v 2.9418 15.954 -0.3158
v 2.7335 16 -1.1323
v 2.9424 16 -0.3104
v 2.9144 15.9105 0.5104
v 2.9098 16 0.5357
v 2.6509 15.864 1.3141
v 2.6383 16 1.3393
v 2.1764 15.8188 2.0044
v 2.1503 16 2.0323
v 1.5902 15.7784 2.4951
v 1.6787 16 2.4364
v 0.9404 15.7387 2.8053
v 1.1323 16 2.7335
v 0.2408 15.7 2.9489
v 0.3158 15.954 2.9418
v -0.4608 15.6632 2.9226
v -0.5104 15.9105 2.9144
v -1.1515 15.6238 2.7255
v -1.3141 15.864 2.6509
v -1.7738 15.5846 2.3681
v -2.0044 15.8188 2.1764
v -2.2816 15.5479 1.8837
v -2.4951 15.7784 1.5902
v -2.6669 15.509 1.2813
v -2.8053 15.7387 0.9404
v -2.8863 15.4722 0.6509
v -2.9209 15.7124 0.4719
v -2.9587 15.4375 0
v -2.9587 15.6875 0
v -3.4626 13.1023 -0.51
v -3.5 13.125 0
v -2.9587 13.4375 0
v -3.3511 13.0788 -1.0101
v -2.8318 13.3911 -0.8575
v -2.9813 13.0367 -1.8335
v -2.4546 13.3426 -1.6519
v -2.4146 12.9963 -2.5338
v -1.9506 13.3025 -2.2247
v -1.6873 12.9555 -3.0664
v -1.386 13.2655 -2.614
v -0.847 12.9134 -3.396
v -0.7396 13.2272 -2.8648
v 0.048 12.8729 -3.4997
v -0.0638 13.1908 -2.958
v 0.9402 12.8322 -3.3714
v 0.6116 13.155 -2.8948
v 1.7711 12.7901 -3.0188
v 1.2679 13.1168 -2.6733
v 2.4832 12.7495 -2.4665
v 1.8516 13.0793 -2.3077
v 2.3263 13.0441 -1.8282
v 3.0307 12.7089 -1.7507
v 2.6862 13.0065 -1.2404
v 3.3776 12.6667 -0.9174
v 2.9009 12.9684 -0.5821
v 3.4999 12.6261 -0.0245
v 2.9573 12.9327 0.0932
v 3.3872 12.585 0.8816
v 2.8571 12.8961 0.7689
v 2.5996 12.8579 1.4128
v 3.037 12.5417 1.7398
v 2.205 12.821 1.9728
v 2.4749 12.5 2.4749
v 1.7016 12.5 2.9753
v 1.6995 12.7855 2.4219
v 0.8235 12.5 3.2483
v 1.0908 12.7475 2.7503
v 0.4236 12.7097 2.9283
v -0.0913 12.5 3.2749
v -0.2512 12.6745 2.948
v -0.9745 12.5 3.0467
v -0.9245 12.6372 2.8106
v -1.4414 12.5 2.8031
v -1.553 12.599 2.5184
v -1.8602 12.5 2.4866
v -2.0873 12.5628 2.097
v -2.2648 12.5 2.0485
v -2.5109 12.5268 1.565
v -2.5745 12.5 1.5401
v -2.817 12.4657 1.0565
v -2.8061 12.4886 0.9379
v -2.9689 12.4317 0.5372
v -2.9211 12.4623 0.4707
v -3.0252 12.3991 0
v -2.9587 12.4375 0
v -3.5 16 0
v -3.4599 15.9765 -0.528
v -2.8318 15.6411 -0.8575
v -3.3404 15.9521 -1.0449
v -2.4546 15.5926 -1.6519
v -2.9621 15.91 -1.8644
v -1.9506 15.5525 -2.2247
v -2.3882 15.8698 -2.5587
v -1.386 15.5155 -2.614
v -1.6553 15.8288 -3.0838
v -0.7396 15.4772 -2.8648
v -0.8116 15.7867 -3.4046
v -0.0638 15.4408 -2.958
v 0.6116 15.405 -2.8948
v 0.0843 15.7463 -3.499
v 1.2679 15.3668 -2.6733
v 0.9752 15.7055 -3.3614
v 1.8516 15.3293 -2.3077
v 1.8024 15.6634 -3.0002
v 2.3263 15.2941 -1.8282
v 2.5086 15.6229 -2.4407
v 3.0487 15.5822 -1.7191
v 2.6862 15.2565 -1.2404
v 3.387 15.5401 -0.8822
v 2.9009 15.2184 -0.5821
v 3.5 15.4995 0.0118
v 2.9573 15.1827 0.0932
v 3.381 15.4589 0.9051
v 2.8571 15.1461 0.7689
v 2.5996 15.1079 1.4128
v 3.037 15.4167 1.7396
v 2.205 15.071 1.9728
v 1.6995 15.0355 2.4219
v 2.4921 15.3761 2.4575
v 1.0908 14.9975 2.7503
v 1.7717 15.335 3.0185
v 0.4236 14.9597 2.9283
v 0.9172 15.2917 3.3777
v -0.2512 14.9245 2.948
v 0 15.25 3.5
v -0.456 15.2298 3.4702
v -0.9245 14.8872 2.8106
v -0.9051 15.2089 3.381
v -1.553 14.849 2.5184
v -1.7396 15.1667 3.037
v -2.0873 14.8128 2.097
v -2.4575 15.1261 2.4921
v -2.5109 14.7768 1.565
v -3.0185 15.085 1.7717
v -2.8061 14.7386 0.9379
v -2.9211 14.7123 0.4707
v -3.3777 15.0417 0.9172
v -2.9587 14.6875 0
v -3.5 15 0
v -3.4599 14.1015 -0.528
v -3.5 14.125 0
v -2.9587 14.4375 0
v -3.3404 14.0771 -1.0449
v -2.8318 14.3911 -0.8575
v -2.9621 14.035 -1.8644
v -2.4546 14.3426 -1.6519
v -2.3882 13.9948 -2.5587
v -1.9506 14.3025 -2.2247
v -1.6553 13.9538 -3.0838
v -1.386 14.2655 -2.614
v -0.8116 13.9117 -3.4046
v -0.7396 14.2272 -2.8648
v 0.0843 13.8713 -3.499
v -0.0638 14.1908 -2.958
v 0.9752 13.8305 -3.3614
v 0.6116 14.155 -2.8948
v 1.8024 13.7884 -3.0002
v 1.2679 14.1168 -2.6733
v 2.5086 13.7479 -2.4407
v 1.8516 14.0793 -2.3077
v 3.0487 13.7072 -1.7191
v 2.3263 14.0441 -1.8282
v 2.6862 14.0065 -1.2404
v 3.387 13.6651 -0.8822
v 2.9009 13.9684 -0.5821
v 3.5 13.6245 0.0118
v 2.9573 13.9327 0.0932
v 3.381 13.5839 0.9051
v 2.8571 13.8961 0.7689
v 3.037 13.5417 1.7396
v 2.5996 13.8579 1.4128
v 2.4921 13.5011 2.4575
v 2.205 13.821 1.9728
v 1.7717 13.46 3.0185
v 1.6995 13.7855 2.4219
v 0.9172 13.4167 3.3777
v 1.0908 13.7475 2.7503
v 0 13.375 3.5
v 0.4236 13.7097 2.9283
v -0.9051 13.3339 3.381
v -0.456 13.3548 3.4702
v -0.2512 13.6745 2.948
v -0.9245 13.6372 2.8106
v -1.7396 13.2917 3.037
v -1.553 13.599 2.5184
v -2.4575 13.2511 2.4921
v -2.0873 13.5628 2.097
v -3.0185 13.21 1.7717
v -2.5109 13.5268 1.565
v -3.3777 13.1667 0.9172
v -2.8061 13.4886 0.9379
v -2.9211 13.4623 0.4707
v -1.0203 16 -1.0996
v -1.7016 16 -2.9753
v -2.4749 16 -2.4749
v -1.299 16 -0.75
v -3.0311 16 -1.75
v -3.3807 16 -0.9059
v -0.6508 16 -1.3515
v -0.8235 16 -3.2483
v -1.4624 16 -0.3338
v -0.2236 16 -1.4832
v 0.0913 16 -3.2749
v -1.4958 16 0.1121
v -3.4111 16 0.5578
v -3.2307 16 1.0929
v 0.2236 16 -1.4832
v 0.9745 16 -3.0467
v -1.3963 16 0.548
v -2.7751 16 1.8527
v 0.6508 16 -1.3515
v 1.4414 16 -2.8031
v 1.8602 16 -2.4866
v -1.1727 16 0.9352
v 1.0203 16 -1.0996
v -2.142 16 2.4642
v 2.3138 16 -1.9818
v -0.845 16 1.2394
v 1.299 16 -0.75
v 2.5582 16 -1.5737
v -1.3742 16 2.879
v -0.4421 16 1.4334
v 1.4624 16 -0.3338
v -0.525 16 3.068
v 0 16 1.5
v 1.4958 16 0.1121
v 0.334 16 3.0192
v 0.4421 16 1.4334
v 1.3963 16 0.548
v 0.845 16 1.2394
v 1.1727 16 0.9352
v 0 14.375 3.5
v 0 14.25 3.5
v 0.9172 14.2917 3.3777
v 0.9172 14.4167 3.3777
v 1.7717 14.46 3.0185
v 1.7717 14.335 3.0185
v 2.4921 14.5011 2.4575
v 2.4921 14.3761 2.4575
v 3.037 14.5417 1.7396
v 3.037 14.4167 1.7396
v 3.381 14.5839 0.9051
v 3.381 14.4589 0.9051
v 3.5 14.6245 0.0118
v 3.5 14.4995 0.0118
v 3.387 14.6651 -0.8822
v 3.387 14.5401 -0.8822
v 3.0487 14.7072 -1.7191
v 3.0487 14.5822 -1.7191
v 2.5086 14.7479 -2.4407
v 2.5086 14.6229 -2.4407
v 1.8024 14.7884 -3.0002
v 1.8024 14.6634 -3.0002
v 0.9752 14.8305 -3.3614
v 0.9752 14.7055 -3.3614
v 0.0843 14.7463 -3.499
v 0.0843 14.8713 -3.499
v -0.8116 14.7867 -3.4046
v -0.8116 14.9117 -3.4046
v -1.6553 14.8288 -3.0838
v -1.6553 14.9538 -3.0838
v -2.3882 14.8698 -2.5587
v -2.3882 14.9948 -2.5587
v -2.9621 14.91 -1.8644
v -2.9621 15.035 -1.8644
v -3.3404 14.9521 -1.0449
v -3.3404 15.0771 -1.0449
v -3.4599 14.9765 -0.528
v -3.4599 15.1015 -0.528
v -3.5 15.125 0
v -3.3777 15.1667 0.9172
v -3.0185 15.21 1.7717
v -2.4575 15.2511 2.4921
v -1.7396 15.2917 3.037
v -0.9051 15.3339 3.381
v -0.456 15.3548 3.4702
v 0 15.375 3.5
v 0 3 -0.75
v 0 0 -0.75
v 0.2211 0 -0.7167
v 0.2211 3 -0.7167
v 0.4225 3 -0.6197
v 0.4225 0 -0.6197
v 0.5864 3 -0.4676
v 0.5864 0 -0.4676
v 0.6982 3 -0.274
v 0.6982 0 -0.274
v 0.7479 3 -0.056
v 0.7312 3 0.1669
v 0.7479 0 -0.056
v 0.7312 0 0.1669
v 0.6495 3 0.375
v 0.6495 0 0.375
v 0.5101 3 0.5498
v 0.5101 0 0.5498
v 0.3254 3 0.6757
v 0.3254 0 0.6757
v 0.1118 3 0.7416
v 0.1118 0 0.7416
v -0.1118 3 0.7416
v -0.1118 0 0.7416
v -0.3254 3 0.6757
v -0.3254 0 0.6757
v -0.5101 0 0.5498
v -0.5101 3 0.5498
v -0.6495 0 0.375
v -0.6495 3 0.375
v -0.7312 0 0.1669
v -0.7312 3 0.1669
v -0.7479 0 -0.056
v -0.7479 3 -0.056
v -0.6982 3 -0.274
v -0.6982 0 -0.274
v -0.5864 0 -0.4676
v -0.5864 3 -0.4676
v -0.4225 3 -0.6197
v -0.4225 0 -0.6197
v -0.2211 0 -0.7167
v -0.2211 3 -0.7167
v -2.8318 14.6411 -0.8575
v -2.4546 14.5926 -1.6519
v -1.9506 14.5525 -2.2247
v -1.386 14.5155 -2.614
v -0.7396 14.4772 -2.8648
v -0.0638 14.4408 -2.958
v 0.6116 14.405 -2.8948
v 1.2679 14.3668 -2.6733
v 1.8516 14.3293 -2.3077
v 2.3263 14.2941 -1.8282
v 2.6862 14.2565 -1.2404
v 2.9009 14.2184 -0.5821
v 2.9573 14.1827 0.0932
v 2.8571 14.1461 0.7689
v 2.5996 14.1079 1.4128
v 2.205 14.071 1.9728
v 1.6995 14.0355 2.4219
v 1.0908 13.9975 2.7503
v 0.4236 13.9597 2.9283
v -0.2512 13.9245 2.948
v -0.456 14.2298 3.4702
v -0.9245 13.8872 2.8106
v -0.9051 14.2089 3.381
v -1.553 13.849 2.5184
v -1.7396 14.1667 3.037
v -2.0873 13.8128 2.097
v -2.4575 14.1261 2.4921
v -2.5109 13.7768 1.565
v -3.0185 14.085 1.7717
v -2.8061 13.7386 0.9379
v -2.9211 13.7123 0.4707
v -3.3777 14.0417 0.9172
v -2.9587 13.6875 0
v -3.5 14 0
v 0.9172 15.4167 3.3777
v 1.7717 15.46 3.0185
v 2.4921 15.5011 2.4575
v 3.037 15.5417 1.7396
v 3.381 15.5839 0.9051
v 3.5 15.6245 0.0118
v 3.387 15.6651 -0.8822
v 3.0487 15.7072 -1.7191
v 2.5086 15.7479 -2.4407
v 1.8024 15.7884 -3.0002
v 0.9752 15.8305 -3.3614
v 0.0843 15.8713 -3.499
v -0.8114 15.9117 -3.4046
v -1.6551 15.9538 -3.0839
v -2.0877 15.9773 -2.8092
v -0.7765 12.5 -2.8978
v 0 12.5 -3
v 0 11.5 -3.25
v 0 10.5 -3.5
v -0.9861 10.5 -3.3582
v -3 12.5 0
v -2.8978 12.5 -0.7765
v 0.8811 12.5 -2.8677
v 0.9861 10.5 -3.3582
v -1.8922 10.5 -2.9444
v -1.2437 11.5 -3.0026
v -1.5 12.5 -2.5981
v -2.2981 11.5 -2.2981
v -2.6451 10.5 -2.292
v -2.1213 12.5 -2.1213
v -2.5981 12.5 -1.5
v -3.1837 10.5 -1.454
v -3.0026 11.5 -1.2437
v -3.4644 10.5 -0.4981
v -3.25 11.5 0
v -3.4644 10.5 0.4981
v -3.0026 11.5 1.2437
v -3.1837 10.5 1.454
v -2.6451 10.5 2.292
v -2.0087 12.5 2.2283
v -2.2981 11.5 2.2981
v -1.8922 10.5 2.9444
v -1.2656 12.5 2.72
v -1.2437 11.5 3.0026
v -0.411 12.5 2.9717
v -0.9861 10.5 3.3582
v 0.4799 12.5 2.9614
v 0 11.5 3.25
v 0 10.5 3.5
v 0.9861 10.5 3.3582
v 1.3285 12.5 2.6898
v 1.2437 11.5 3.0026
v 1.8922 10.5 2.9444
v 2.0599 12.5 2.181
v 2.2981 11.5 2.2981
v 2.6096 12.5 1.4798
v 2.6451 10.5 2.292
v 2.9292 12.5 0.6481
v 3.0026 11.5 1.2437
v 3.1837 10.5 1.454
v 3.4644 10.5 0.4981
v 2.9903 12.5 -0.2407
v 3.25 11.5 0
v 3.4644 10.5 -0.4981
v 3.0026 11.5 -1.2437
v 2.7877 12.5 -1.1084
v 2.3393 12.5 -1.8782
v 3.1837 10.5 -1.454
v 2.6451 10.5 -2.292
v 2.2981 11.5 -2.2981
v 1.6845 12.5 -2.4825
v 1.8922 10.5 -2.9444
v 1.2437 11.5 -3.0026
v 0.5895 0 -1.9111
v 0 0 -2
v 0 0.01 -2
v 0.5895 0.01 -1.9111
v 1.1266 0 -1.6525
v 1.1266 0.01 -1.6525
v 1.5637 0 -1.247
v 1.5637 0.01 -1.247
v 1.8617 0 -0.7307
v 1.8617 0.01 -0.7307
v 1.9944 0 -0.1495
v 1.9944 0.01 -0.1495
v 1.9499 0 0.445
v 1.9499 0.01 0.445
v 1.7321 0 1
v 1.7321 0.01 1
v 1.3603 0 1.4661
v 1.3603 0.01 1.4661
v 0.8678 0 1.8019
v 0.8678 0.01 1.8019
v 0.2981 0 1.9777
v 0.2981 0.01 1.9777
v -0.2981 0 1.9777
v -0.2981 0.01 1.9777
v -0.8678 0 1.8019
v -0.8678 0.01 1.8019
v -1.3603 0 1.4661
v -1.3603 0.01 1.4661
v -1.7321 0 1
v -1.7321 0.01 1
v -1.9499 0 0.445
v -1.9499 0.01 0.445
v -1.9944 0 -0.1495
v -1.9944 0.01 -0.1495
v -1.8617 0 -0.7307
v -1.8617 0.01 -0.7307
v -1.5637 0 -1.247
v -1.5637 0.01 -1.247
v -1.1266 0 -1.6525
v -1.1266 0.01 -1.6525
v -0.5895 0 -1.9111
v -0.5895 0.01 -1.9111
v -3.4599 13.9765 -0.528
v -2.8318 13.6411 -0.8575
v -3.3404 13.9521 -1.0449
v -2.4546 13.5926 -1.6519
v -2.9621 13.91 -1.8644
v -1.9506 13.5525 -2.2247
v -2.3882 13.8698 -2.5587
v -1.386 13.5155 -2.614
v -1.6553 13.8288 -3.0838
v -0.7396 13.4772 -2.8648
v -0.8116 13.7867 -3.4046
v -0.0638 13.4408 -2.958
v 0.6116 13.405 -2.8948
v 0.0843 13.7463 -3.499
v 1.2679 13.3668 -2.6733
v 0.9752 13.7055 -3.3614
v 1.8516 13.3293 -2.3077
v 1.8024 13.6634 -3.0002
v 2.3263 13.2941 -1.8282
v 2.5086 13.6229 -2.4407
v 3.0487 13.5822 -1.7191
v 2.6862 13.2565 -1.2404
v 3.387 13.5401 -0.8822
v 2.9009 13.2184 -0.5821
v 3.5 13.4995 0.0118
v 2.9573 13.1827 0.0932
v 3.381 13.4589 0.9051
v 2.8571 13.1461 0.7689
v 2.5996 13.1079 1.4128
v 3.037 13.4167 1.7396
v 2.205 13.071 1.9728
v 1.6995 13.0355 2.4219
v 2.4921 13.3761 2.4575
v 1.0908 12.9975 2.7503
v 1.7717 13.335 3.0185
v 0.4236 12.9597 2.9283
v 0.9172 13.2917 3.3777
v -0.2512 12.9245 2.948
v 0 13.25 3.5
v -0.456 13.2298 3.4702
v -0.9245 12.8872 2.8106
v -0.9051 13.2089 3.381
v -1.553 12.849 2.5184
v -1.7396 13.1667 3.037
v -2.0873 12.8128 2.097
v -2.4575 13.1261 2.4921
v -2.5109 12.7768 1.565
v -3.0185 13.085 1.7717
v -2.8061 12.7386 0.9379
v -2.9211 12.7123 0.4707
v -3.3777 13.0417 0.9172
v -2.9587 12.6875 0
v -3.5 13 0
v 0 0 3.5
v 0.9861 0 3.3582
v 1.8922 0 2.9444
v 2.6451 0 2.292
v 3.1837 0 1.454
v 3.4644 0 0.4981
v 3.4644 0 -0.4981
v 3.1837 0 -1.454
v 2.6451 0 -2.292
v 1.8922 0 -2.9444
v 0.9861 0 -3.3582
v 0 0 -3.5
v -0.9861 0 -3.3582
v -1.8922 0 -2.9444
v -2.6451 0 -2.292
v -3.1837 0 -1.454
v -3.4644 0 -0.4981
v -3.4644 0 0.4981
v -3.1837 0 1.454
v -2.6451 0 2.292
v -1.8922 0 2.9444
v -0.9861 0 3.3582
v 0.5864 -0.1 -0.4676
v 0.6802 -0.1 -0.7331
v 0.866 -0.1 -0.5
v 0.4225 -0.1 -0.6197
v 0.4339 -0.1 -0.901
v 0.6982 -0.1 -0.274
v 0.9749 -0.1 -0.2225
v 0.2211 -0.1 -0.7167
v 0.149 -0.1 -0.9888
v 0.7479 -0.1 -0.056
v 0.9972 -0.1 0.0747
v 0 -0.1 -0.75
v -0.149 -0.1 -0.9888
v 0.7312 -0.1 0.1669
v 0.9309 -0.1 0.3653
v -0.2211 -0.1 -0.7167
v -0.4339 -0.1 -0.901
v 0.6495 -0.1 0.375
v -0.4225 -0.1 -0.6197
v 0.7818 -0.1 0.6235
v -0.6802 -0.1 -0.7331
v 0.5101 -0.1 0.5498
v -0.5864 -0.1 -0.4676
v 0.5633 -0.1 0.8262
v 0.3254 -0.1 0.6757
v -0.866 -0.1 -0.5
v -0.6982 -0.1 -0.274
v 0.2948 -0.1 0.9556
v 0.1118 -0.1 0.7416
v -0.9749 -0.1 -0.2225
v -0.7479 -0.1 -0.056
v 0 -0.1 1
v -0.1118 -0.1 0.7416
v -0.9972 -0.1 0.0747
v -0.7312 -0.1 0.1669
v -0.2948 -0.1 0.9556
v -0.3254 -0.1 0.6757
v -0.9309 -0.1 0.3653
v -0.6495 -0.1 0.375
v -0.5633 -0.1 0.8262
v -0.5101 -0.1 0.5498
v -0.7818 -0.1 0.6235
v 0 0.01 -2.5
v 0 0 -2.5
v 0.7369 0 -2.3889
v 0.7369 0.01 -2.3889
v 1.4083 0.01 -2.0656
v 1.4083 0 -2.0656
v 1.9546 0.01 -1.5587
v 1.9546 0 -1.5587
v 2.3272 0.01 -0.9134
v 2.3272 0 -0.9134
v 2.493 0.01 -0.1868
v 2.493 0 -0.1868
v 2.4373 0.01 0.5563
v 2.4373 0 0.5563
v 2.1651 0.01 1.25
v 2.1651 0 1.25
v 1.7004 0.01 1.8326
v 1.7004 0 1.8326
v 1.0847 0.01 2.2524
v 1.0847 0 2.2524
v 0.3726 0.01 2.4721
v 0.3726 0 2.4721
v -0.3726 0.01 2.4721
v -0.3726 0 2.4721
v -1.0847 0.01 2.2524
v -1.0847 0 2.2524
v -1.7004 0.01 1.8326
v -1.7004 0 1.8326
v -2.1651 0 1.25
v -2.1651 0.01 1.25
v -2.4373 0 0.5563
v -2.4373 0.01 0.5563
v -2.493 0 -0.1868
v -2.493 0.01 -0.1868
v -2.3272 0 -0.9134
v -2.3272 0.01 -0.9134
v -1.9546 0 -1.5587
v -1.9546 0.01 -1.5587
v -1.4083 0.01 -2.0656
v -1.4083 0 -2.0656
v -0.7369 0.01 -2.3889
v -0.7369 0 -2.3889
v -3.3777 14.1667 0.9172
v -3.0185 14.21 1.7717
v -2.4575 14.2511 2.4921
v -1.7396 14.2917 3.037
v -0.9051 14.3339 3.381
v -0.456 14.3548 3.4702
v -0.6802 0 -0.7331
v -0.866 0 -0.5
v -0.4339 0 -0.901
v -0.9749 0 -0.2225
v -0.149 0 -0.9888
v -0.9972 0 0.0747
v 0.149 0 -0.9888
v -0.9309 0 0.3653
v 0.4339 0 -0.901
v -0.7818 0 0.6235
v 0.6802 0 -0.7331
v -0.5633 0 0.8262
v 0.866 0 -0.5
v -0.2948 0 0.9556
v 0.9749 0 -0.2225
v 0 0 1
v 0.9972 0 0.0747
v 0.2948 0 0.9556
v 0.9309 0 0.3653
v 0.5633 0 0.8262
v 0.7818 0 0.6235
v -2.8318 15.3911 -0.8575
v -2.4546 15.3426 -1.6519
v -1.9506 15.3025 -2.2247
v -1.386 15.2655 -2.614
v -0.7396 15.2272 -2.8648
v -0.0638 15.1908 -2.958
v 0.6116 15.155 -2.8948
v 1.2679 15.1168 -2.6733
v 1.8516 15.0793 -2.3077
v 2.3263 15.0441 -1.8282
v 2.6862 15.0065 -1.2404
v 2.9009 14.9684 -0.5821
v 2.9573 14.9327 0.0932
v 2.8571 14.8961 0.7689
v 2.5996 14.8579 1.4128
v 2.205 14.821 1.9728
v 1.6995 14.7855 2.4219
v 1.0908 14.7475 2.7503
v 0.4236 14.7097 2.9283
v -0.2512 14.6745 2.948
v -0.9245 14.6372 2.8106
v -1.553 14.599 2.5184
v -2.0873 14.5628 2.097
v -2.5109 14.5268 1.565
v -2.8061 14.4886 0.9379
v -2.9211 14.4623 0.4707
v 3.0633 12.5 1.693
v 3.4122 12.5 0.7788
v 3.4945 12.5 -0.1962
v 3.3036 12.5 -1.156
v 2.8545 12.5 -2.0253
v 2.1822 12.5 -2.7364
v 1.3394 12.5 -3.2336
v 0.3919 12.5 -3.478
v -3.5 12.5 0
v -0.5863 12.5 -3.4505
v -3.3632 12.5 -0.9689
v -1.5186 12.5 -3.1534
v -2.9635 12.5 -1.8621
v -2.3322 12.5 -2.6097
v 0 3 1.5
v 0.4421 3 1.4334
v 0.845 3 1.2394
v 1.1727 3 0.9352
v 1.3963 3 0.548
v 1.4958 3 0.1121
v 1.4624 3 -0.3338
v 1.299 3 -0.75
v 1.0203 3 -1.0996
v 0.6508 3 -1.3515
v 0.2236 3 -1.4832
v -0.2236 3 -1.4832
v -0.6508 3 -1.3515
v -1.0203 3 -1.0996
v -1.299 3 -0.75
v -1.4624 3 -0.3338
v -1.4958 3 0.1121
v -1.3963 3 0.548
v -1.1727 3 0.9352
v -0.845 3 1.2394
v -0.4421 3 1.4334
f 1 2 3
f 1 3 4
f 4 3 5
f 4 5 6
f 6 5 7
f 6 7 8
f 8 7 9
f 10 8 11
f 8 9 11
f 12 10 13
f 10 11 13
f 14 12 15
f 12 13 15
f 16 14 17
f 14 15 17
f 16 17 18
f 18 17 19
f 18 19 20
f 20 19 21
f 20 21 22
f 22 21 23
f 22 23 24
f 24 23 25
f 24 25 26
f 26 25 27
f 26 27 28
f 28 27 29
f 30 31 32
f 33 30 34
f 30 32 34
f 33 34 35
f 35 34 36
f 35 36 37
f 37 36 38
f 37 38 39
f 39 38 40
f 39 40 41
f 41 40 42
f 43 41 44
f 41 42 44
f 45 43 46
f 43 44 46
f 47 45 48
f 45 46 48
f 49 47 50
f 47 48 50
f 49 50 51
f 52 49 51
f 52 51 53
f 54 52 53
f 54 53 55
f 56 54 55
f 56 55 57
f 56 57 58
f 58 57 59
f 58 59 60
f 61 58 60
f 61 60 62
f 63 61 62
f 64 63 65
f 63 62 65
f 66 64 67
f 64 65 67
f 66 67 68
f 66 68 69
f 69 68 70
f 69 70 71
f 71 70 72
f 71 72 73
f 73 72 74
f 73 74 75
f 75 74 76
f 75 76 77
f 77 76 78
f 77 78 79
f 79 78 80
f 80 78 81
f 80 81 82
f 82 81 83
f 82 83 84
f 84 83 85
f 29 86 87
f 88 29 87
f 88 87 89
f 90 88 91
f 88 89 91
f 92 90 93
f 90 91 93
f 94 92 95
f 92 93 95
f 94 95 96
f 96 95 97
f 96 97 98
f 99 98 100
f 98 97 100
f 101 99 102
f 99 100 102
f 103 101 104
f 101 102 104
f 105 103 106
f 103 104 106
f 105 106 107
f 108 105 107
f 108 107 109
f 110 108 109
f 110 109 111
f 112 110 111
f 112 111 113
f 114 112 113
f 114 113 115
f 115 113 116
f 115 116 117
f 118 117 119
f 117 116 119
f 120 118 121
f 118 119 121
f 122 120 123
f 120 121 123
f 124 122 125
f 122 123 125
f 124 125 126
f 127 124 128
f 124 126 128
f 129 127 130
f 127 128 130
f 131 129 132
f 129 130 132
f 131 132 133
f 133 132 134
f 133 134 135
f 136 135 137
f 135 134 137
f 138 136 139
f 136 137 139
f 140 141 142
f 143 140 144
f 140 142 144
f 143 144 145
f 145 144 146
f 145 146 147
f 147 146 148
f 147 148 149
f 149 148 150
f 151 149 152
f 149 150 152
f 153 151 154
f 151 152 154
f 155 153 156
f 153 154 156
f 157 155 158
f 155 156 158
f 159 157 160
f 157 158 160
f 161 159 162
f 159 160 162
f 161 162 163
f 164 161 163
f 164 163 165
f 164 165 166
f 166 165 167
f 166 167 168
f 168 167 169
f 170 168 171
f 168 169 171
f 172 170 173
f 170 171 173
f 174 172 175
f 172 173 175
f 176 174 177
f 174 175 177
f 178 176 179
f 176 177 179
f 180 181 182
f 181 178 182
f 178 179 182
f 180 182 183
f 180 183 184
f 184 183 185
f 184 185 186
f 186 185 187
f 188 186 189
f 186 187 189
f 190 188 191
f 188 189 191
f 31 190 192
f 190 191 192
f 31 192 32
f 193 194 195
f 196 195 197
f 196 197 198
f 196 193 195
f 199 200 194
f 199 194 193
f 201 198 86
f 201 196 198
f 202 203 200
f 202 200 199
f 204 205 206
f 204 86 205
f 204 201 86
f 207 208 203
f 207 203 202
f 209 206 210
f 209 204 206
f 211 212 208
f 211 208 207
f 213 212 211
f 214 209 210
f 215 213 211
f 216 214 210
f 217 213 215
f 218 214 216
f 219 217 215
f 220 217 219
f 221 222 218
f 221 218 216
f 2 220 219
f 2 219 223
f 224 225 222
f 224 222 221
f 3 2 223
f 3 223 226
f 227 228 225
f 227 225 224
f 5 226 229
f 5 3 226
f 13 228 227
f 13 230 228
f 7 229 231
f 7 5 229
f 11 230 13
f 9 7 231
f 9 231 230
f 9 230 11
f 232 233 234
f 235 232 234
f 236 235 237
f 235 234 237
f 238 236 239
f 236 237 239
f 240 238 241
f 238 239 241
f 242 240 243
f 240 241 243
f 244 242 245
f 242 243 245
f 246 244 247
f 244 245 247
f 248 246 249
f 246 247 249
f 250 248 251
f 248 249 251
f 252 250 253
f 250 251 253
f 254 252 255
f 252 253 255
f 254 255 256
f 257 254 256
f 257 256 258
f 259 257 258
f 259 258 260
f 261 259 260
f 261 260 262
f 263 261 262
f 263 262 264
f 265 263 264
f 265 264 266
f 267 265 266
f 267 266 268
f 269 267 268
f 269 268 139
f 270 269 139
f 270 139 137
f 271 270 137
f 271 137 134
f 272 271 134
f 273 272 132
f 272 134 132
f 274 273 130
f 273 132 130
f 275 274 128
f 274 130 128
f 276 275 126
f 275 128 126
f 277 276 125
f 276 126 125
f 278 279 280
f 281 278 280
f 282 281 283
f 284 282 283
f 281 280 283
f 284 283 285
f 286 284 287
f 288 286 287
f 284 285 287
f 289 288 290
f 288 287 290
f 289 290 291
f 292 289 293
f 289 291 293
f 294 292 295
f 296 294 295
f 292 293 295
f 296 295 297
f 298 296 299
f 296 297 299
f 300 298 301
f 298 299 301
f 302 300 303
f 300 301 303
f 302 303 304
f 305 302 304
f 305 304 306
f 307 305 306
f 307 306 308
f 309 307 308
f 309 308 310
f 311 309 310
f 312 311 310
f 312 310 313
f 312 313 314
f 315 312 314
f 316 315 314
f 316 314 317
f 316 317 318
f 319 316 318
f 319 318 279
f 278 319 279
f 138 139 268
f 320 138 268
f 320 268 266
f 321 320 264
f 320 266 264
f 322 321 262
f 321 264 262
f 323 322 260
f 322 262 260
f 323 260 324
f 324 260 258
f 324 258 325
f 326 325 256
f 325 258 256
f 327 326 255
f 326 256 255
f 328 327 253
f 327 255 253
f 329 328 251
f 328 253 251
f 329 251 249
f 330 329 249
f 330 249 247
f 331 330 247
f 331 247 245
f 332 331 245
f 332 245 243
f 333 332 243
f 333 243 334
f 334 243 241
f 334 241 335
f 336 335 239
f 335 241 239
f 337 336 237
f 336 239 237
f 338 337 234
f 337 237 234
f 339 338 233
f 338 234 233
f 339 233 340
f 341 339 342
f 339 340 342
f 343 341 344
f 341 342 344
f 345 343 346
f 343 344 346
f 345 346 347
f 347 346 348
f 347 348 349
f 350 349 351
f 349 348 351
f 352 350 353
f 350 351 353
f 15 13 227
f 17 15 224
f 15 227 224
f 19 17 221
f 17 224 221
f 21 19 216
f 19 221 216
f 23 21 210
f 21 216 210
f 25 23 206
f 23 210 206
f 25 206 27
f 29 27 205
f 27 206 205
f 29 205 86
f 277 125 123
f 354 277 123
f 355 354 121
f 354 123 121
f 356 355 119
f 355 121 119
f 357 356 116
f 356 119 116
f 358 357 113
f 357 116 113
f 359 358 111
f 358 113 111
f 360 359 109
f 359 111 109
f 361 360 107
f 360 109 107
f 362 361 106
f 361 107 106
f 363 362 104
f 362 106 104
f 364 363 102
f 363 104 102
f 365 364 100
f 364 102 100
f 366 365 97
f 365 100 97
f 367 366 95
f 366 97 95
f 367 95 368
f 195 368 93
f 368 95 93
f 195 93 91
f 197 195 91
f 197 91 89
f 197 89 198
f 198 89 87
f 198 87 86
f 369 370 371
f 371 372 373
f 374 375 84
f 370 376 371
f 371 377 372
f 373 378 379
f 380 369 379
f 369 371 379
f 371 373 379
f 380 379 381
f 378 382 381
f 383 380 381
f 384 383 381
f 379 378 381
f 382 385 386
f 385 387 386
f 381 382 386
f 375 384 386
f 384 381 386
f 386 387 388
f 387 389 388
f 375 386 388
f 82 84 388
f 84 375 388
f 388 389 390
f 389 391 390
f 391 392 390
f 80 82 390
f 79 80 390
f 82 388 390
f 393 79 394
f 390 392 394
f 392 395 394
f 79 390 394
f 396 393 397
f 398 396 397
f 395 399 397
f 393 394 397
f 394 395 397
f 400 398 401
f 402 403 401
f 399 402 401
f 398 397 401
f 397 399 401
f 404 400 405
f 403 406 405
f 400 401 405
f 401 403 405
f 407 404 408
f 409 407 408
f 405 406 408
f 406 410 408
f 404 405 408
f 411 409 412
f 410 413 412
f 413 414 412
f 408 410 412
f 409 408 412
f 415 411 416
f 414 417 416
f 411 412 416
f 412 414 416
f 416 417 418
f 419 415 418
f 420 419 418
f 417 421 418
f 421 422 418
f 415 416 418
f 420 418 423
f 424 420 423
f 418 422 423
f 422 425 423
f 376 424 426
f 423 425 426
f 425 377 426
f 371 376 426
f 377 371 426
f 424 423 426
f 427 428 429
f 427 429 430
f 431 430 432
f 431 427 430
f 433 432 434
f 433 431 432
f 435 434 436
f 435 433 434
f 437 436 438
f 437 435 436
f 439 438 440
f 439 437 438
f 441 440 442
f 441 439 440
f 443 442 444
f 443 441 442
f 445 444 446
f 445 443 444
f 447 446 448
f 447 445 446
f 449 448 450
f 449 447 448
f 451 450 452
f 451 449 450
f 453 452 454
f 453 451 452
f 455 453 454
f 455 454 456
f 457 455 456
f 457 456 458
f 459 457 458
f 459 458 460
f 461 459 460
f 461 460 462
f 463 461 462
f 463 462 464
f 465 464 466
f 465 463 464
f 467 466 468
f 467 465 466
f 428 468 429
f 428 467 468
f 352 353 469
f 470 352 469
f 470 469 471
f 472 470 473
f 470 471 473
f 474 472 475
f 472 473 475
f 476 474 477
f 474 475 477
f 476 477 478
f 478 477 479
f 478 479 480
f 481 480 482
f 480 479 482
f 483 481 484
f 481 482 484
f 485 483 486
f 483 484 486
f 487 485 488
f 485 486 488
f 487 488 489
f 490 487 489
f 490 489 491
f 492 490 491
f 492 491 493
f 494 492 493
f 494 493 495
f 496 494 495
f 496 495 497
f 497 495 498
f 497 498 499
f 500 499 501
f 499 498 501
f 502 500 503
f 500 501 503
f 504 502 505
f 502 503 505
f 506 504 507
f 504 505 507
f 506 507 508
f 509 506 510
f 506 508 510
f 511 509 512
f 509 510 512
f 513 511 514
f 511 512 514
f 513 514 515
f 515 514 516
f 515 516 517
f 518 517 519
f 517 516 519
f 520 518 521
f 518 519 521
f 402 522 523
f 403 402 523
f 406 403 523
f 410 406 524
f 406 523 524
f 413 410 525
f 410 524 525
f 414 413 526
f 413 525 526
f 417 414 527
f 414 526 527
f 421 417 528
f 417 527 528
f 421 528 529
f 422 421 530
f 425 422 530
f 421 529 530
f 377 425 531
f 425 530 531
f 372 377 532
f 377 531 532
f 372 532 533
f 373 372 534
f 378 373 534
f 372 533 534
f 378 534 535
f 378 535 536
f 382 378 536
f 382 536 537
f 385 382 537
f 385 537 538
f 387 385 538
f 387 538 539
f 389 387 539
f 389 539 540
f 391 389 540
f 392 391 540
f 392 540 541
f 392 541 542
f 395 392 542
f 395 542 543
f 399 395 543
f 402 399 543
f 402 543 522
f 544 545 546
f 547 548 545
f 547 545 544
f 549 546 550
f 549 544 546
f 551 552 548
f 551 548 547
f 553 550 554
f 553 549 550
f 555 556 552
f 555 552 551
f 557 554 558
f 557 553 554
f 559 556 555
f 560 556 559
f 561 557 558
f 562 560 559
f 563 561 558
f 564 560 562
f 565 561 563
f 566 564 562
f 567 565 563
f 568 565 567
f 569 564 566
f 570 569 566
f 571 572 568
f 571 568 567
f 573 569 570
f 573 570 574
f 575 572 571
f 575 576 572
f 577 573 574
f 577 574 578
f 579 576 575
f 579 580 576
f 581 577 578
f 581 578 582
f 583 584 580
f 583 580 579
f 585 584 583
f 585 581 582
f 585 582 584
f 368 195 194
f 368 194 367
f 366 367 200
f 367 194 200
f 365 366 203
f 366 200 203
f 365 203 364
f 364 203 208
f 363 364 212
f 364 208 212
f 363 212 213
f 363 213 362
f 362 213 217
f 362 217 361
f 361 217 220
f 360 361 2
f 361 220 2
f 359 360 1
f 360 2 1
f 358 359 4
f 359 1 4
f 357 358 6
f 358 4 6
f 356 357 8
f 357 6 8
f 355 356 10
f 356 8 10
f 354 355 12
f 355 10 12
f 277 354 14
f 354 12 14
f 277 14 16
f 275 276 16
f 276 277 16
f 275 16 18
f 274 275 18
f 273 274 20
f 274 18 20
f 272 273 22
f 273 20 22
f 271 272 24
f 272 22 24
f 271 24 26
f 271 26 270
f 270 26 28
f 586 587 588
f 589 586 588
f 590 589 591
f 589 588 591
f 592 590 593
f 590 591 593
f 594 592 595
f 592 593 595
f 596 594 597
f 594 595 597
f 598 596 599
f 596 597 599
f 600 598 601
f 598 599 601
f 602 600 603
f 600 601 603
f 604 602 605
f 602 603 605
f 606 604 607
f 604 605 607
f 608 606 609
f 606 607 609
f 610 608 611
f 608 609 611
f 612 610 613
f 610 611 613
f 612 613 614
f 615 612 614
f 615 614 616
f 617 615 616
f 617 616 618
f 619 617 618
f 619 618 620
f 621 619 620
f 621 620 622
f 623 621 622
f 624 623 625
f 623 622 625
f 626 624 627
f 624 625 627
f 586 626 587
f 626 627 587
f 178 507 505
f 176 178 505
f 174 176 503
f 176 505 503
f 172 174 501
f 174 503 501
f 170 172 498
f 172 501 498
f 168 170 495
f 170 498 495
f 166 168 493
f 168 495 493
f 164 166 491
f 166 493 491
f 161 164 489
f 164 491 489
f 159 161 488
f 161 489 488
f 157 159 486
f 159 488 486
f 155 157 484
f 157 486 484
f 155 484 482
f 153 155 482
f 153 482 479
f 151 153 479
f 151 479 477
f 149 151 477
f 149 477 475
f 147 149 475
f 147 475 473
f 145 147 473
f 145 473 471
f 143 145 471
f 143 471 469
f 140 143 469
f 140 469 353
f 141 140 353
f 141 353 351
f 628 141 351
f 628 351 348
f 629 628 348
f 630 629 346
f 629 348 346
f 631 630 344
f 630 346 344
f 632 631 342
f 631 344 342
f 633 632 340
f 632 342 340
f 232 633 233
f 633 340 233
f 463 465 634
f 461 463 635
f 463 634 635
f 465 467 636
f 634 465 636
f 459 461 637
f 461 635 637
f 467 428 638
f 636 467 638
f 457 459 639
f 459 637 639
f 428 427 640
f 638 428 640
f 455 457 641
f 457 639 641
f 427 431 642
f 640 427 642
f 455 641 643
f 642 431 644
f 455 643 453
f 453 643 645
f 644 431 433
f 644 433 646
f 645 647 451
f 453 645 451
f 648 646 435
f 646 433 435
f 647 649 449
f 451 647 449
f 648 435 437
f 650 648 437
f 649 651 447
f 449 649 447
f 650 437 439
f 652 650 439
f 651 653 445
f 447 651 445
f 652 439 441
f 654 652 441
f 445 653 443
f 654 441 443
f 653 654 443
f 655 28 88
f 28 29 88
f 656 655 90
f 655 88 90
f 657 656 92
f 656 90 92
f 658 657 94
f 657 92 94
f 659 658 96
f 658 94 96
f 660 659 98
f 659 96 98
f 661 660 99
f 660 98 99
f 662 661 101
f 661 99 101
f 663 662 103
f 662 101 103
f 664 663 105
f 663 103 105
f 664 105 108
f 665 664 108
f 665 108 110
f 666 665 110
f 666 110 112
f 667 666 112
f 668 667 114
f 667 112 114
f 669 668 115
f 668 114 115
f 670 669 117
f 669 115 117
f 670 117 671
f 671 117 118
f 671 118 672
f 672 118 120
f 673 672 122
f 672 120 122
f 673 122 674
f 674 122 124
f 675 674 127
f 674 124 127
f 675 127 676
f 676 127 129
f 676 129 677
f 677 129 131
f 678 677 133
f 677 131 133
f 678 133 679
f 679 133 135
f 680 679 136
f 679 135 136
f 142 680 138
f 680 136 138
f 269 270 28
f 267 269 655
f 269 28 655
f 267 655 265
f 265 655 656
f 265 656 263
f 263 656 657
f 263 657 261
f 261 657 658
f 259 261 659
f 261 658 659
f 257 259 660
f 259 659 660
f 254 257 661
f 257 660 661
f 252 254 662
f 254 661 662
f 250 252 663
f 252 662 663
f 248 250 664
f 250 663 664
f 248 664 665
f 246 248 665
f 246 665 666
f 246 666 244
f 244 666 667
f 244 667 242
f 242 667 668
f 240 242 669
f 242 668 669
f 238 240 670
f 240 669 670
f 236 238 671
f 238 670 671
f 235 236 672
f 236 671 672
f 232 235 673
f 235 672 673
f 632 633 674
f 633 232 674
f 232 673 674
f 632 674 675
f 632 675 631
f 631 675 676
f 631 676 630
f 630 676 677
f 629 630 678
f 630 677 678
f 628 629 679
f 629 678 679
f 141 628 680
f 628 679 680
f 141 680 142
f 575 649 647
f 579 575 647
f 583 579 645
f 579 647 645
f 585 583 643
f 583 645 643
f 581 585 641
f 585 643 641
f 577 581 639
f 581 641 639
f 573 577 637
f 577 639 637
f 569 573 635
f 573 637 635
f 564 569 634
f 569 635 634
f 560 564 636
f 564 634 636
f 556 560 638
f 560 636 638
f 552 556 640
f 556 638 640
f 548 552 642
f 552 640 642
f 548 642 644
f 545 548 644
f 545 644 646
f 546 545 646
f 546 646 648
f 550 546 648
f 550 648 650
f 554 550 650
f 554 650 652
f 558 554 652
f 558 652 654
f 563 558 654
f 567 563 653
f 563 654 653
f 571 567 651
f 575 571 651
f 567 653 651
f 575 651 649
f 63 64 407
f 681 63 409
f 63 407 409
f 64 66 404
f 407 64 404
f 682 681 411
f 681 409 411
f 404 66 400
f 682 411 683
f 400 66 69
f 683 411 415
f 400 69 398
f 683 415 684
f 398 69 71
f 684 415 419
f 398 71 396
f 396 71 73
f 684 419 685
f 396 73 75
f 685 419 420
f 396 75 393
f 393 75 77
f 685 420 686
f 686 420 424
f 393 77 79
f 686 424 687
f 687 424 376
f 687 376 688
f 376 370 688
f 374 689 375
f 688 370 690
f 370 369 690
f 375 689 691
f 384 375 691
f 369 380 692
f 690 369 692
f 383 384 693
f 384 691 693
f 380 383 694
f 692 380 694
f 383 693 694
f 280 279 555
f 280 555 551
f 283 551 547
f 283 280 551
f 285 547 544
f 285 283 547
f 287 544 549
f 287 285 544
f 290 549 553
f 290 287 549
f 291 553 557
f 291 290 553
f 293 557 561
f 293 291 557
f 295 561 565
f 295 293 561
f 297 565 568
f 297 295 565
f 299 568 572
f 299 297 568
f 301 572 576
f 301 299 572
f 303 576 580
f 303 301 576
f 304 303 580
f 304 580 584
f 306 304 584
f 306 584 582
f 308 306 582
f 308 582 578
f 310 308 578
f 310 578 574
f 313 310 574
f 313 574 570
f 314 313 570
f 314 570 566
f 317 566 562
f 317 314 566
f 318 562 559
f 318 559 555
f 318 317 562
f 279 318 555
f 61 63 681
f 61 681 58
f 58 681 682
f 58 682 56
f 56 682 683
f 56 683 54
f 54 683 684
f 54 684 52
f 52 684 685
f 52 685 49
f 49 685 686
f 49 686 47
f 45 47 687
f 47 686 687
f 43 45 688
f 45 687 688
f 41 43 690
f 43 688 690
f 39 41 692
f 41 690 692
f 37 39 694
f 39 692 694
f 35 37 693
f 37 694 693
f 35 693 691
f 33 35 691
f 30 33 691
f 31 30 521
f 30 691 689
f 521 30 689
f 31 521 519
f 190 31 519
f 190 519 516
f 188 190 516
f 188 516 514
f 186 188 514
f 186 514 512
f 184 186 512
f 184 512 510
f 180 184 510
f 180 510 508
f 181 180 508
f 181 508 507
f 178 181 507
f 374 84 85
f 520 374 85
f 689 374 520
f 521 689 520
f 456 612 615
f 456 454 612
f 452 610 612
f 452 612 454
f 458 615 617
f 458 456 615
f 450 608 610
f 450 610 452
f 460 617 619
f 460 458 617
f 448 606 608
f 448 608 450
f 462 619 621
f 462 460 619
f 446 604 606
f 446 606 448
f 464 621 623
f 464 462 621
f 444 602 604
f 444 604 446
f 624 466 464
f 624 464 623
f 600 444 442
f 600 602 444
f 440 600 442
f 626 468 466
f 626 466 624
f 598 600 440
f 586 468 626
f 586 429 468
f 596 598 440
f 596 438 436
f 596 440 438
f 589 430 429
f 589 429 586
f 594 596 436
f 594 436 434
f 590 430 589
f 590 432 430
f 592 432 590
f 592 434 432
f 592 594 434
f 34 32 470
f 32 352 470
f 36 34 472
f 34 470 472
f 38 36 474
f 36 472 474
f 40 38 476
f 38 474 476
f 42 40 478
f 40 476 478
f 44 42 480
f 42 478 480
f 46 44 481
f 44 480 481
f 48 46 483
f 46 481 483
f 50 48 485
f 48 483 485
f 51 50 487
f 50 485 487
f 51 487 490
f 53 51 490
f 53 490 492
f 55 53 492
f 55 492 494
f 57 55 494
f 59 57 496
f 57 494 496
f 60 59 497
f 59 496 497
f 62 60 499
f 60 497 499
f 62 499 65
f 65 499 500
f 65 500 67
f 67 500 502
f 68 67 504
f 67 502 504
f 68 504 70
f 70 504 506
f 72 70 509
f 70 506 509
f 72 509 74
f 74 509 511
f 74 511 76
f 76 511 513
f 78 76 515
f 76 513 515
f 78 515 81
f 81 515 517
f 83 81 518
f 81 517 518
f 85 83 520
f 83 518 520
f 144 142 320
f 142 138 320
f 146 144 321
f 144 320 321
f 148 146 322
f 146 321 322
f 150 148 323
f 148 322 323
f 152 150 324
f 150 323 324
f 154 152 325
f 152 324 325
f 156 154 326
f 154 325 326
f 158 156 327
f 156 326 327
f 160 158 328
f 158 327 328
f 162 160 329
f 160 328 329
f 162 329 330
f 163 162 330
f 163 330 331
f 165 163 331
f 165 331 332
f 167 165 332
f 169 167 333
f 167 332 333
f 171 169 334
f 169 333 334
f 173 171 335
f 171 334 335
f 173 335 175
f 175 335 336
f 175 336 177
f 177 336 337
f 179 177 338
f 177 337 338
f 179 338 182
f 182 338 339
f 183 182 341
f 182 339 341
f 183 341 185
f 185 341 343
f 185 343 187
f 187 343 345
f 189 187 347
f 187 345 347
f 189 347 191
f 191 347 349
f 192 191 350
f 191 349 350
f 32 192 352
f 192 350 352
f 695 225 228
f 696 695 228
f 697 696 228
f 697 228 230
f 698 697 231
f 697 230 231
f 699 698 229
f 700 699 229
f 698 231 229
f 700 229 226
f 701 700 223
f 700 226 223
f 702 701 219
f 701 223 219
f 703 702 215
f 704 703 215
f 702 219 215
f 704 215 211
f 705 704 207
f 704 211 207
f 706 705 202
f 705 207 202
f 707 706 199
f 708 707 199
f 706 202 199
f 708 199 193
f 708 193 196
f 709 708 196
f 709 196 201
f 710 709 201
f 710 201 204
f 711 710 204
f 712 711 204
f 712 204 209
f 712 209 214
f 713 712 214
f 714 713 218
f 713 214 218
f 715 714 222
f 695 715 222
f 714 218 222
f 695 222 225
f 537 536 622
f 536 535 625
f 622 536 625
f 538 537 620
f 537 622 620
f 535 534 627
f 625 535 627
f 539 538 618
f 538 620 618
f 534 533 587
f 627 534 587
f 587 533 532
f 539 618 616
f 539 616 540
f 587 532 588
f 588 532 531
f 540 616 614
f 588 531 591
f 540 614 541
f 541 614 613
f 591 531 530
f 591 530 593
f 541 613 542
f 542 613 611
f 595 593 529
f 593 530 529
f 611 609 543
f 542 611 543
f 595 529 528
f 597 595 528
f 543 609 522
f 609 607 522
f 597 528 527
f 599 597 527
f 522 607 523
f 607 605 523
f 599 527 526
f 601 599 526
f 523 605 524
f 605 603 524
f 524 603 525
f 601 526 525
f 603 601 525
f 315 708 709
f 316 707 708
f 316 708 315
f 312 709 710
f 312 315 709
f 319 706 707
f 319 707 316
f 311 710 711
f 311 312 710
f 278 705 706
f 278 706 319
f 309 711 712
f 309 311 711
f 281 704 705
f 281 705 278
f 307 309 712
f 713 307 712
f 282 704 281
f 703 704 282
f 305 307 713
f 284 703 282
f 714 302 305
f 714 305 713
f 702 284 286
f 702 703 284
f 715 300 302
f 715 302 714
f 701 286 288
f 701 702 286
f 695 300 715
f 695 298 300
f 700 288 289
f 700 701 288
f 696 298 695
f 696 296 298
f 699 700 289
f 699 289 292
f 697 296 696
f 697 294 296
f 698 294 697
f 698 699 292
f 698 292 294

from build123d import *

# Parameters (mm, degrees)
MAINBODYS_R              = 3.5
MAIN_BODY_DEPTH          = 16
CONTACTETCHS_R           = 2.5
CONTACTETCHS_R_2         = 2
CONTACT_ETCH_DEPTH       = 0.01
ARMATURECONTACTS_R       = 1
ARMATURECONTACTS_R_2     = 0.75
ARMATURE_CONTACT_DEPTH   = 0.1
ARMATURETHRUHOLES_R      = 0.75
ARMATURE_THRU_HOLE_DEPTH = 17.748134224
BORES_R                  = 1.5
BORE_DEPTH               = 13
M7_X_5_PITCH             = 1


with BuildPart() as part:
    # MainBodyS → MAIN BODY (new body)
    with BuildSketch(Plane(origin=(0, 0, 0), x_dir=(1, 0, 0), z_dir=(0, 1, 0))):
        with Locations(Location((0, 0, 0), (0, 0, 270))):
            Circle(MAINBODYS_R)
    extrude(amount=MAIN_BODY_DEPTH)

    # ContactEtchS → CONTACT ETCH (cut)
    with BuildSketch(Plane.XZ):
        with Locations(Location((0, 0, 0), (0, 0, 270))):
            Circle(CONTACTETCHS_R)
        with Locations(Location((0, 0, 0), (0, 0, 270))):
            Circle(CONTACTETCHS_R_2, mode=Mode.SUBTRACT)
    extrude(amount=-CONTACT_ETCH_DEPTH, mode=Mode.SUBTRACT)

    # ArmatureContactS → ARMATURE CONTACT (add)
    with BuildSketch(Plane(origin=(0, 0, 0), x_dir=(-1, 0, 0), z_dir=(0, -1, 0))):
        with Locations(Location((0, 0, 0), (0, 0, 270))):
            Circle(ARMATURECONTACTS_R)
        with Locations(Location((0, 0, 0), (0, 0, 90))):
            Circle(ARMATURECONTACTS_R_2, mode=Mode.SUBTRACT)
    extrude(amount=ARMATURE_CONTACT_DEPTH)

    # ArmatureThruHoleS → ARMATURE THRU HOLE (cut, through all)
    with BuildSketch(Plane.XZ):
        with Locations(Location((0, 0, 0), (0, 0, 270))):
            Circle(ARMATURETHRUHOLES_R)
    extrude(amount=-ARMATURE_THRU_HOLE_DEPTH, mode=Mode.SUBTRACT)

    # ThreadCutS → THREAD CUT (revolve, cut)
    with BuildSketch(Plane.XY, mode=Mode.PRIVATE) as thread_cut_sk:
        Polygon((3, 12.5), (3.5, 10.5), (3.5, 12.5), align=None)
    revolve(thread_cut_sk.sketch.rotate(Axis((0, 0, 0), (0, 1, 0)), 90), axis=Axis((0, 0, 0), (0, 1, 0)), mode=Mode.SUBTRACT)

    # BoreS → BORE (cut)
    with BuildSketch(Plane(origin=(0, 16, 0), x_dir=(1, 0, 0), z_dir=(0, 1, 0))):
        with Locations(Location((0, 0, 0), (0, 0, 270))):
            Circle(BORES_R)
    extrude(amount=-BORE_DEPTH, mode=Mode.SUBTRACT)

    # M7 x .5: arcs per turn and ends read off the stored shape
    # M7 x .5: the profile of Thread Profile3 profile screwed along a right-hand helix through 4 turns, 8 arcs to a turn; built about Z, then put on its axis
    m7_x_5_z = Axis((0, 0, 0), (0, 0, 1))
    m7_x_5_corners = [(3.5003, 0, -0.000173205), (3.5003, 0, 0.875173202), (2.958734125, 0, 0.562499999), (2.958734125, 0, 0.312499999)]
    with BuildLine(mode=Mode.PRIVATE) as m7_x_5_profile:
        Line(m7_x_5_corners[0], m7_x_5_corners[1])
        Line(m7_x_5_corners[1], m7_x_5_corners[2])
        Line(m7_x_5_corners[2], m7_x_5_corners[3])
        Line(m7_x_5_corners[3], m7_x_5_corners[0])
    m7_x_5_cap = Face(m7_x_5_profile.wire())
    m7_x_5_turn_angles = [0, 22.5, 45, 67.5, 90, 112.5, 135, 157.5, 180, 202.5, 225, 247.5, 270, 292.5, 315, 337.5, 360]
    m7_x_5_turn_weights = [1, 0.9238795325112867, 1, 0.9238795325112867, 1, 0.9238795325112867, 1, 0.9238795325112867, 1, 0.9238795325112867, 1, 0.9238795325112867, 1, 0.9238795325112867, 1, 0.9238795325112867, 1]
    m7_x_5_turn_rails = [Edge.make_bspline([Vector(p[0], p[1], 0).rotate(m7_x_5_z, m7_x_5_turn_angles[k]) / m7_x_5_turn_weights[k] + Vector(0, 0, p[2] + M7_X_5_PITCH * m7_x_5_turn_angles[k] / 360) for k in range(17)], [0, 0, 0, 1, 1, 2, 2, 3, 3, 4, 4, 5, 5, 6, 6, 7, 7, 8, 8, 8], 2, m7_x_5_turn_weights) for p in m7_x_5_corners]
    m7_x_5_turn_sides = [Face.make_surface_from_curves(m7_x_5_turn_rails[p[0]], m7_x_5_turn_rails[p[1]]) for p in [(0, 1), (1, 2), (2, 3), (3, 0)]]
    m7_x_5 = Plane(origin=(0, 17, 0), x_dir=(-1, 0, 0), z_dir=(0, -1, 0)) * Solid(Shell([*[p.moved(Location((0, 0, M7_X_5_PITCH * i))) for i in range(4) for p in m7_x_5_turn_sides], m7_x_5_cap, m7_x_5_cap.rotate(m7_x_5_z, 1440).moved(Location((0, 0, M7_X_5_PITCH * 1440 / 360)))]))
    add(m7_x_5, mode=Mode.SUBTRACT)


solid = part.part
